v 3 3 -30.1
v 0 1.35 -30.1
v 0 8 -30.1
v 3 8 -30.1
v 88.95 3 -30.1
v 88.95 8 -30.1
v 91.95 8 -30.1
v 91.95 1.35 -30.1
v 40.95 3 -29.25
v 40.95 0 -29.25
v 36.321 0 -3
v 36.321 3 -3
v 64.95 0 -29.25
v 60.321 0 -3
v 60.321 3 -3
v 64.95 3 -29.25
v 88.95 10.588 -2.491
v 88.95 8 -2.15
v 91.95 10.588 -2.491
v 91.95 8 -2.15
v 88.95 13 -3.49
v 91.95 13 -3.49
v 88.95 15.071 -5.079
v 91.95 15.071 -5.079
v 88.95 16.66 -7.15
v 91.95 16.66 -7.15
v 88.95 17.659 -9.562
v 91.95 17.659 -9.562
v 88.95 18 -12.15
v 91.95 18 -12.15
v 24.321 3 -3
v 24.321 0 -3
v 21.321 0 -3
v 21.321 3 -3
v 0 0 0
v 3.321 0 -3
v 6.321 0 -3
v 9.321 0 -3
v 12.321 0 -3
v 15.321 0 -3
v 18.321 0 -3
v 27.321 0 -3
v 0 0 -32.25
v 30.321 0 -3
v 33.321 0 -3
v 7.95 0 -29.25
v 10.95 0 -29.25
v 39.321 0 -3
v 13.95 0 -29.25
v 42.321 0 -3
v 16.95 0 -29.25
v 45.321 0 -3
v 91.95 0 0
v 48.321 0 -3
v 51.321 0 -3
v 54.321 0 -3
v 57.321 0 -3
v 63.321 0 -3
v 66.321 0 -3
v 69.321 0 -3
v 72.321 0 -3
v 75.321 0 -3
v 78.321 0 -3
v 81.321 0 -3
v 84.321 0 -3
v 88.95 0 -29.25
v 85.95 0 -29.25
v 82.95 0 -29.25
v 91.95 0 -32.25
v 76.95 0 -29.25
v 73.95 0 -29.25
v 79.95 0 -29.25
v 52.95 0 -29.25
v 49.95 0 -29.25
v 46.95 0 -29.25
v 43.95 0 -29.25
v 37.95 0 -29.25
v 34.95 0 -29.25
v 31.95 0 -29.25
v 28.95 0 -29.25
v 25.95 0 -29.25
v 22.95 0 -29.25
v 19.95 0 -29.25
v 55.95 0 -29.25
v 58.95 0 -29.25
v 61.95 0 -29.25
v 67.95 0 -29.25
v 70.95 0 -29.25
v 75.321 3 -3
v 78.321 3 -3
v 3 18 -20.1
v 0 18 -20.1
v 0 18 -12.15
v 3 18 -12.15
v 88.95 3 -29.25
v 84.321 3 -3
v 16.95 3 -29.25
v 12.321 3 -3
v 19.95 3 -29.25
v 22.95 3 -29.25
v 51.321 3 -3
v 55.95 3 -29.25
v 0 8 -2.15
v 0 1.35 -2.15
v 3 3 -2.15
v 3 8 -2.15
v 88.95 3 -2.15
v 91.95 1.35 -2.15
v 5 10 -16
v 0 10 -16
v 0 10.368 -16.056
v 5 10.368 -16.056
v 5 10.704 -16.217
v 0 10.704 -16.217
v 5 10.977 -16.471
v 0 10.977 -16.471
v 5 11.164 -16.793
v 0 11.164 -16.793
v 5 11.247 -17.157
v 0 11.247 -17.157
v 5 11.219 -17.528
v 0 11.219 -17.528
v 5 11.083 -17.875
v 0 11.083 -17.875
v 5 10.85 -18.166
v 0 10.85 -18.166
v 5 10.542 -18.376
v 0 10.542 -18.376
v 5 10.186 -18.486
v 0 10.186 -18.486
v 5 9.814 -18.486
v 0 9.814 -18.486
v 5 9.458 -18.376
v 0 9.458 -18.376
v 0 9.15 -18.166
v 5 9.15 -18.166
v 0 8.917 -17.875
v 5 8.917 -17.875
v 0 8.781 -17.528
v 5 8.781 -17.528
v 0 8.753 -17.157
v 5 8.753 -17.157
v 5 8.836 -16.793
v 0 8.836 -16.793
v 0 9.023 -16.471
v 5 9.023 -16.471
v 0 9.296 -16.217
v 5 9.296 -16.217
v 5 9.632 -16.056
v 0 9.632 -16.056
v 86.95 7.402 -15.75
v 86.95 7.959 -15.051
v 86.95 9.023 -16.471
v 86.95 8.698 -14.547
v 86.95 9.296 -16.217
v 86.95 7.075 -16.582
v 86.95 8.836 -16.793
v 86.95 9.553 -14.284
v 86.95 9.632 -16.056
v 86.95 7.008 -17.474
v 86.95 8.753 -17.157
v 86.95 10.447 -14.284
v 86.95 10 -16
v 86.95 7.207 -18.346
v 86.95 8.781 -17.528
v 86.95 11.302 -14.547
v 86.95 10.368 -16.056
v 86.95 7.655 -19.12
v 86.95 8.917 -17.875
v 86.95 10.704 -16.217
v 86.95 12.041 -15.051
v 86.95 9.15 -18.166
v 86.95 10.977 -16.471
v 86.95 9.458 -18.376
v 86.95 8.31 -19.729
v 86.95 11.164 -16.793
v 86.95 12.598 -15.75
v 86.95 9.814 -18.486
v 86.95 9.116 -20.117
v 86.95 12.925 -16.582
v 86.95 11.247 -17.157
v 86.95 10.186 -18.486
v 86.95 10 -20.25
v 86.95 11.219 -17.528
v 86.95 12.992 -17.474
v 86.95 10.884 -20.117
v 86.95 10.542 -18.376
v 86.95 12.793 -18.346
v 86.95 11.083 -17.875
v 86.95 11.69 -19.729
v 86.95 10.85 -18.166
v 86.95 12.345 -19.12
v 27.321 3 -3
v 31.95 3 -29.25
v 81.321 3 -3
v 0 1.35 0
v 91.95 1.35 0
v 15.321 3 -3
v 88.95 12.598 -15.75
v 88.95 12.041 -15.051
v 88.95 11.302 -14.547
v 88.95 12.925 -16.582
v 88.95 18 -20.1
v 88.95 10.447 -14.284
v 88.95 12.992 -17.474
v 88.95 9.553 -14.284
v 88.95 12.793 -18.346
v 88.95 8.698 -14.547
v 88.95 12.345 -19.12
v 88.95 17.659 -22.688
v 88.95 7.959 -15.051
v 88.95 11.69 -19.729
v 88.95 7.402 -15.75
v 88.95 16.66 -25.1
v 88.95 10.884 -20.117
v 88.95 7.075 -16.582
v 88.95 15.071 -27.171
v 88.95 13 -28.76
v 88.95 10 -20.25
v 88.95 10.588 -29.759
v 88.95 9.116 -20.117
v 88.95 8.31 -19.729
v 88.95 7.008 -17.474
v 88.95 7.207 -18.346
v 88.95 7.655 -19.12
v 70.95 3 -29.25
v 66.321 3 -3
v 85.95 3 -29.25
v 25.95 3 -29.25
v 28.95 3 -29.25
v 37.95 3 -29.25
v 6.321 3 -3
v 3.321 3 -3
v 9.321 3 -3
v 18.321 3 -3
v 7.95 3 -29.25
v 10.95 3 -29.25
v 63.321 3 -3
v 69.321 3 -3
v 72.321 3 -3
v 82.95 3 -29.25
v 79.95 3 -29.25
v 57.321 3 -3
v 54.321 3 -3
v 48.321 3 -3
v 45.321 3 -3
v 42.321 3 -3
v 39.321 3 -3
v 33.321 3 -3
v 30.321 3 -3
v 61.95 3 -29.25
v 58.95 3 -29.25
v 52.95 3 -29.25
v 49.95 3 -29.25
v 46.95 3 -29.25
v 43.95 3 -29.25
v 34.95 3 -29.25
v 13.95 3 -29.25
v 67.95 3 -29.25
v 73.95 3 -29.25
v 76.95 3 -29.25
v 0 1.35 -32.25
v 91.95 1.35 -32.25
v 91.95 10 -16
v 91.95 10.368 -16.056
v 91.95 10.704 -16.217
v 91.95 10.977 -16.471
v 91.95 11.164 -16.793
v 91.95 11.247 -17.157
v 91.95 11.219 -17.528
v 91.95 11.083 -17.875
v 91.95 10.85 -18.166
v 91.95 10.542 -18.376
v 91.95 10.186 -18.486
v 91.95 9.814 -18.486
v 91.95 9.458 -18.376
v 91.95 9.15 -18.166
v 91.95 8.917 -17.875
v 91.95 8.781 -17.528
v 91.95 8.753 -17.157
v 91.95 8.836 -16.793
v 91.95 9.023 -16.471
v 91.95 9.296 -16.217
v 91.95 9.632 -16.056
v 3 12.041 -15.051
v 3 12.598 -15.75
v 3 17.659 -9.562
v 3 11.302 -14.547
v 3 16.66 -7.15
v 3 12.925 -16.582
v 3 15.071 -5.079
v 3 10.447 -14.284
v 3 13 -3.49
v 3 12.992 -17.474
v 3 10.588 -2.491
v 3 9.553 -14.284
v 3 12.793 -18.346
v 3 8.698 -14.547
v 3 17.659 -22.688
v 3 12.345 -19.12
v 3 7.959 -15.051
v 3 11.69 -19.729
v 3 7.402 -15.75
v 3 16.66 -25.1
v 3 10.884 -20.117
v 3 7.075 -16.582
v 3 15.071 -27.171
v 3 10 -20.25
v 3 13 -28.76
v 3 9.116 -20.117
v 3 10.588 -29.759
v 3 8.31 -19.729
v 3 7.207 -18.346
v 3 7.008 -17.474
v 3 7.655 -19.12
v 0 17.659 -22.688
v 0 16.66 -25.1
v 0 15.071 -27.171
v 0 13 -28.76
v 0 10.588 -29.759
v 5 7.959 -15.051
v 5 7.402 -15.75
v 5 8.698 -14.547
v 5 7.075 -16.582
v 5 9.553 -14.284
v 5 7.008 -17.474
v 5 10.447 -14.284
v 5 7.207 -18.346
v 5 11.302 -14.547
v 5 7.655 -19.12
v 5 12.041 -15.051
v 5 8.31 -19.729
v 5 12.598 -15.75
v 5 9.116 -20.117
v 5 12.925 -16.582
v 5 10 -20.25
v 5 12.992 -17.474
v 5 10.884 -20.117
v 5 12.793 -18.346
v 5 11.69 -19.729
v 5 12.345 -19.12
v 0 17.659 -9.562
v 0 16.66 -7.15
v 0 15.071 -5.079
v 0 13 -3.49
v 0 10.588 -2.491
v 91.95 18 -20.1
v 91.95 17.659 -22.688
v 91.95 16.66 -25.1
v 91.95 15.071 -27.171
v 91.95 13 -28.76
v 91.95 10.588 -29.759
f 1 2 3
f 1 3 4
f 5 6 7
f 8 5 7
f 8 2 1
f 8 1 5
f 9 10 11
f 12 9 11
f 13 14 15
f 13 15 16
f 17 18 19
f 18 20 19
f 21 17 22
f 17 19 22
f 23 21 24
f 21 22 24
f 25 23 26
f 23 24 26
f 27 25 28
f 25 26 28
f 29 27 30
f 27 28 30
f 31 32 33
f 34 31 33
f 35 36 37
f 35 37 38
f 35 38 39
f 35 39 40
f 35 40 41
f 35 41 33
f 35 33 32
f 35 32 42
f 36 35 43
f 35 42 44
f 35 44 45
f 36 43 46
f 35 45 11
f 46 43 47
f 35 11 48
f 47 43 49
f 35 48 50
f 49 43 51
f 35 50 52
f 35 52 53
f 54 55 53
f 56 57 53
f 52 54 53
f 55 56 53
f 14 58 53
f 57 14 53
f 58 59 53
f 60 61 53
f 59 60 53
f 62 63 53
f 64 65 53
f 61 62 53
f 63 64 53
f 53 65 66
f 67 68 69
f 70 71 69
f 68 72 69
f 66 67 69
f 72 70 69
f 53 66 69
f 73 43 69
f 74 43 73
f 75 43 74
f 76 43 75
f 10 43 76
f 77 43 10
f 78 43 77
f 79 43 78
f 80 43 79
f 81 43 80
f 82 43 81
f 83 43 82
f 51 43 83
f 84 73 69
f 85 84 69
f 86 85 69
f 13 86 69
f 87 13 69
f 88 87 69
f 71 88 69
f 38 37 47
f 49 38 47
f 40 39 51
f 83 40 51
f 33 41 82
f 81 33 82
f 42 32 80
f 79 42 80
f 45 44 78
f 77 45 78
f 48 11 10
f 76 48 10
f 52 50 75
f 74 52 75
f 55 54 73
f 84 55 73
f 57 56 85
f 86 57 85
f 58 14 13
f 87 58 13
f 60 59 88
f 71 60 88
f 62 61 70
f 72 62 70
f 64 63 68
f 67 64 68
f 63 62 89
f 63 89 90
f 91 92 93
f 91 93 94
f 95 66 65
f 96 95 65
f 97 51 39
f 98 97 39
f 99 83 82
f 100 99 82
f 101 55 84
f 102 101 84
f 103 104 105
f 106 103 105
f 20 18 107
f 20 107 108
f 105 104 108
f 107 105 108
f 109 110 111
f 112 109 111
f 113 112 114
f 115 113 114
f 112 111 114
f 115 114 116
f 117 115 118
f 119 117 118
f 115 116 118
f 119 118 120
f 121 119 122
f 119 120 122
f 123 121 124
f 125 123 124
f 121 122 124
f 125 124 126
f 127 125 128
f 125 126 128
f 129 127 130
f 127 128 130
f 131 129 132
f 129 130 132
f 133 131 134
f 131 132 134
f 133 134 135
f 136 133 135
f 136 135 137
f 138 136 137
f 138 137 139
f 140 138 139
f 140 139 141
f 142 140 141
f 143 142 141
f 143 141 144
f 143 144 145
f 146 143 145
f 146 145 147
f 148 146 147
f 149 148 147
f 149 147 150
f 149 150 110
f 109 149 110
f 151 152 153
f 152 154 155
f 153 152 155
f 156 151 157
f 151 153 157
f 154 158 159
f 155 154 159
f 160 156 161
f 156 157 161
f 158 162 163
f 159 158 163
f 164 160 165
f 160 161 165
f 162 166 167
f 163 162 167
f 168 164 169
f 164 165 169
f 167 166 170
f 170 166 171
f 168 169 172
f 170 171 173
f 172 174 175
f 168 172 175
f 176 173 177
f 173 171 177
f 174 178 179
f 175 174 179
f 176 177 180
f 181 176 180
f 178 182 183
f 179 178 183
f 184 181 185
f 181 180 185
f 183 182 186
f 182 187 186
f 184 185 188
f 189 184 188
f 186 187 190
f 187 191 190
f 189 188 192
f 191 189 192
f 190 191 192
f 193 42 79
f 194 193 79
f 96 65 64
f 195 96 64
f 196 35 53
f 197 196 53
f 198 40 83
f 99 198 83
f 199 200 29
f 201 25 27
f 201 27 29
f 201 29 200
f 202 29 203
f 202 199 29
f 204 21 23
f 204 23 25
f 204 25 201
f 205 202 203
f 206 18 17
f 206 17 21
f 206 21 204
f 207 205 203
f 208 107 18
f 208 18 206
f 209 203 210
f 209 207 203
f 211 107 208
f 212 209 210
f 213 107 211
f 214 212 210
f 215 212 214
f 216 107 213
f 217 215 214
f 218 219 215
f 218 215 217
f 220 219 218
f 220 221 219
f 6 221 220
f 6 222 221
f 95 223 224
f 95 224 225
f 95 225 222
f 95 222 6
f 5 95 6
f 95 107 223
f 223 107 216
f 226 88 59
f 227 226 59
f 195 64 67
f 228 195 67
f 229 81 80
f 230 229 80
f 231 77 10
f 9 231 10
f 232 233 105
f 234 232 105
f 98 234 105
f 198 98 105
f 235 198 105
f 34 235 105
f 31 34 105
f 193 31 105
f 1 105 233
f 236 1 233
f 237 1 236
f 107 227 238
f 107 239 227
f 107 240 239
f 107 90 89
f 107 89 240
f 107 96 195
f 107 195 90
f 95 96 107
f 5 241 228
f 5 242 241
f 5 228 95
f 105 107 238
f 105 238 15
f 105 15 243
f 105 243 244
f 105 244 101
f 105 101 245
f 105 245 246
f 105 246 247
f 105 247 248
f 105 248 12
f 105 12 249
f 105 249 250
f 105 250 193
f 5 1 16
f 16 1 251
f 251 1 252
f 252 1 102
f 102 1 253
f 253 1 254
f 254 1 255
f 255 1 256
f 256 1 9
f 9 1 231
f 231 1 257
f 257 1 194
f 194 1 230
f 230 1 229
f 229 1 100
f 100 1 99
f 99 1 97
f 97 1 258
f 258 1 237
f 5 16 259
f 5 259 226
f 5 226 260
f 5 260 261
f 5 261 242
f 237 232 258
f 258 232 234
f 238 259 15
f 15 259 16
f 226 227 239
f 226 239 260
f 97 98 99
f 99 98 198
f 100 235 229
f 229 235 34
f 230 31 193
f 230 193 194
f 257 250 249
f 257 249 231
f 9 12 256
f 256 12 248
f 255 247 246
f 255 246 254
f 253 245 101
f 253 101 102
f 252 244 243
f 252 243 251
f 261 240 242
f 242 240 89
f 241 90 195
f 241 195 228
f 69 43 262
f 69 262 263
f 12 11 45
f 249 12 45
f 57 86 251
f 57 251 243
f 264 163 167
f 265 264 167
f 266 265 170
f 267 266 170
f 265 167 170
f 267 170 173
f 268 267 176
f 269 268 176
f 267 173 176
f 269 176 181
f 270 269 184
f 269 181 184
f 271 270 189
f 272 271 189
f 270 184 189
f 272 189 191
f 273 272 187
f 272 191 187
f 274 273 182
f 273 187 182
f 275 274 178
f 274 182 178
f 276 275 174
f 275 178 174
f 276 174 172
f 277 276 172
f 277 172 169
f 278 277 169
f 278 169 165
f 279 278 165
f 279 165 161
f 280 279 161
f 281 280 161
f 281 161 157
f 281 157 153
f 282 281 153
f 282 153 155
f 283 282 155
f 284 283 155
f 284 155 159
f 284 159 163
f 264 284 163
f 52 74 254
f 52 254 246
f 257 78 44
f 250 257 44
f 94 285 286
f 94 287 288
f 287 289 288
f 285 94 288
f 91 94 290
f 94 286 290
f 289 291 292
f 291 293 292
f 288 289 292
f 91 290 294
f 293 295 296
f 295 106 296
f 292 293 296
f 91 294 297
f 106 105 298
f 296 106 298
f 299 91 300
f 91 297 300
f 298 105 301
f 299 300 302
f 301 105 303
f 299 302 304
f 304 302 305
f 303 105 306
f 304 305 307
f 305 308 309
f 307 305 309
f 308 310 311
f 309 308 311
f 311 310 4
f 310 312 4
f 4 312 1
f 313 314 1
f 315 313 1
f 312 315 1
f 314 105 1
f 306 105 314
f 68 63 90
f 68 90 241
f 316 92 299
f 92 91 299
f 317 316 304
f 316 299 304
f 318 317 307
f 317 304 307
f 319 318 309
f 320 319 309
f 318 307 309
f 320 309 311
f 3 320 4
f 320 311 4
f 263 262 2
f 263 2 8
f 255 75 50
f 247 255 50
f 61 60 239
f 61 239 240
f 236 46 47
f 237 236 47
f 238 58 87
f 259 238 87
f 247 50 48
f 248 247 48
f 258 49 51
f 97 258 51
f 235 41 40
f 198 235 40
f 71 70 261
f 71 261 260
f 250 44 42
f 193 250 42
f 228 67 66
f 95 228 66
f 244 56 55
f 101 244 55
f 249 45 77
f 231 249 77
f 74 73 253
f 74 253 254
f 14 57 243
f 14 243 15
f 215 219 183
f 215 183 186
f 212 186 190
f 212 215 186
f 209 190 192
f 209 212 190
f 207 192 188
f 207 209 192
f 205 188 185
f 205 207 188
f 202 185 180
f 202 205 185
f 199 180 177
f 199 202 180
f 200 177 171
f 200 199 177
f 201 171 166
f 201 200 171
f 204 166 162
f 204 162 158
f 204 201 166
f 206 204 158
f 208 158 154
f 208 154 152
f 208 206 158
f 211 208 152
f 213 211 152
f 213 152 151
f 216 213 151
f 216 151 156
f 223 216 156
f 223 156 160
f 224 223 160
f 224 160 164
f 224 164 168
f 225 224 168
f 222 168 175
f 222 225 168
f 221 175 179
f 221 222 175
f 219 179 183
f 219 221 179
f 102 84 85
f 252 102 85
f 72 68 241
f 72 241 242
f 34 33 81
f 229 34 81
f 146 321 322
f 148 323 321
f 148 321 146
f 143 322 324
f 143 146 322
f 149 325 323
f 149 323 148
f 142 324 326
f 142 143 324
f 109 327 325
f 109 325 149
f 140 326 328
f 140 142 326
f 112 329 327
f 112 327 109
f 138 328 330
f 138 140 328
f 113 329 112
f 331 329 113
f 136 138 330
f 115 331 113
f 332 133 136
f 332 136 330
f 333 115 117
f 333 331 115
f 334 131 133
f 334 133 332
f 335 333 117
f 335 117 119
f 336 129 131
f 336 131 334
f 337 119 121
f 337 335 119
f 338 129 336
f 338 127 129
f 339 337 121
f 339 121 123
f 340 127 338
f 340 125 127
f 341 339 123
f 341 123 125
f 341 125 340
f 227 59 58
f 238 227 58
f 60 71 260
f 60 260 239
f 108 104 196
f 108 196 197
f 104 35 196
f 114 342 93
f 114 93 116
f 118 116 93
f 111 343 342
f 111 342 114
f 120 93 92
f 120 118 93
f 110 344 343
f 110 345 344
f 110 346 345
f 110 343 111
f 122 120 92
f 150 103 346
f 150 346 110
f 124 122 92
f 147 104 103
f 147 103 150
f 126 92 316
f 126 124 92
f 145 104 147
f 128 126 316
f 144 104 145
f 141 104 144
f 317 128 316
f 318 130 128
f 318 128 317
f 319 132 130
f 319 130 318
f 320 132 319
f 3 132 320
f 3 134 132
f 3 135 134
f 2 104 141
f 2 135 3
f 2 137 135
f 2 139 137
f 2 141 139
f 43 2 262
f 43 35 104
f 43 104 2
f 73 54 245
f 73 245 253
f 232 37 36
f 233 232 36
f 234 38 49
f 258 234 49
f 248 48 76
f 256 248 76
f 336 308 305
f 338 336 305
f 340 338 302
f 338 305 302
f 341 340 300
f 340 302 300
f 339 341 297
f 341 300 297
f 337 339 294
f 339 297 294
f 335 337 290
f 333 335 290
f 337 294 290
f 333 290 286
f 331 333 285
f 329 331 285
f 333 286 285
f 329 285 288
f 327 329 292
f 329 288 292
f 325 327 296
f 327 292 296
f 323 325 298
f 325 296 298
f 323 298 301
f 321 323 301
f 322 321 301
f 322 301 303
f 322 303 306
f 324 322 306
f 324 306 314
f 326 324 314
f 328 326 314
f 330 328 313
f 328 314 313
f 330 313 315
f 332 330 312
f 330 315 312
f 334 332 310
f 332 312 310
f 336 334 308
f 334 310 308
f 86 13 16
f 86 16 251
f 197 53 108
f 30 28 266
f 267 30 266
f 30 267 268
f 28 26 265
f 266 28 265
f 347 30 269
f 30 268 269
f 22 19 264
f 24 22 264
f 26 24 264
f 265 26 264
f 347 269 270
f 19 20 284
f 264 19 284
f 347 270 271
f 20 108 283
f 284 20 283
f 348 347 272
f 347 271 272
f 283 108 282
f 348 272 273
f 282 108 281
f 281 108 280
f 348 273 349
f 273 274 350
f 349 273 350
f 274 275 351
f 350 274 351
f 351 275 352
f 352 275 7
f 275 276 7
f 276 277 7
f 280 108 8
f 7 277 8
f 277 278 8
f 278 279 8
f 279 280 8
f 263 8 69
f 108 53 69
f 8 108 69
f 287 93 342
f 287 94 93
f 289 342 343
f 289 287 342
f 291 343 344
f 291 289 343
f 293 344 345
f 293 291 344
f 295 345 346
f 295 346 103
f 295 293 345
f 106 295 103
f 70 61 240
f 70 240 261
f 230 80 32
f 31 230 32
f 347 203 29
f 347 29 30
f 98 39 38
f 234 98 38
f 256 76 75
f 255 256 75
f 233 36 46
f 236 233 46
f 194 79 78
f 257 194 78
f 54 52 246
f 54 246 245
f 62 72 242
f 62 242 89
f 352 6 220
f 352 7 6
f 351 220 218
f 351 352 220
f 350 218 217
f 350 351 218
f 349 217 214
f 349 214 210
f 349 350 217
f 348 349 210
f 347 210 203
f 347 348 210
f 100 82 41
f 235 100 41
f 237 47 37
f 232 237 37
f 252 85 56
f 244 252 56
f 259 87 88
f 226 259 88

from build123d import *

# Parameters (mm, degrees)
SKETCH1_W               = 91.95
SKETCH1_H               = 32.25
BOSS_EXTRUDE1_DEPTH     = 3
SKETCH2_W               = 91.95
SKETCH2_H               = 2.15
CUT_EXTRUDE1_DEPTH      = 1.65
SKETCH4_W               = 3
SKETCH4_H               = 27.95
BOSS_EXTRUDE2_DEPTH     = 15
SKETCH5_R               = 1.25
CUT_EXTRUDE2_DEPTH      = 1
CUT_EXTRUDE2_DEPTH_BACK = 92.95
FILLET2_R               = 10
CUT_EXTRUDE5_REACH      = 20
SKETCH8_R               = 3
BOSS_EXTRUDE3_DEPTH     = 2
SKETCH9_R               = 1.25
CUT_EXTRUDE6_DEPTH      = 1
CUT_EXTRUDE6_DEPTH_BACK = 92.95


with BuildPart() as part:
    # Sketch1 → Boss-Extrude1 (new body)
    with BuildSketch(Plane(origin=(0, 0, 0), x_dir=(1, 0, 0), z_dir=(0, 1, 0))):
        with Locations((45.975, 16.125)):
            Rectangle(SKETCH1_W, SKETCH1_H)
    extrude(amount=BOSS_EXTRUDE1_DEPTH)

    # Sketch2 → Cut-Extrude1 (cut)
    with BuildSketch(Plane(origin=(0, 3, 0), x_dir=(1, 0, 0), z_dir=(0, 1, 0))):
        with Locations((45.975, 31.175)):
            Rectangle(SKETCH2_W, SKETCH2_H)
        with Locations((45.975, 1.075)):
            Rectangle(SKETCH2_W, SKETCH2_H)
    extrude(amount=-CUT_EXTRUDE1_DEPTH, mode=Mode.SUBTRACT)

    # Sketch4 → Boss-Extrude2 (add)
    with BuildSketch(Plane(origin=(0, 3, 0), x_dir=(1, 0, 0), z_dir=(0, 1, 0))):
        with Locations((1.5, 16.125)):
            Rectangle(SKETCH4_W, SKETCH4_H)
        with Locations((90.45, 16.125)):
            Rectangle(SKETCH4_W, SKETCH4_H)
    extrude(amount=BOSS_EXTRUDE2_DEPTH)

    # Sketch5 → Cut-Extrude2 (cut, two sides)
    with BuildSketch(Plane.ZY) as cut_extrude2_sk:
        with Locations((-17.25, 10)):
            Circle(SKETCH5_R)
    extrude(amount=CUT_EXTRUDE2_DEPTH, mode=Mode.SUBTRACT)
    extrude(cut_extrude2_sk.sketch, amount=-CUT_EXTRUDE2_DEPTH_BACK, mode=Mode.SUBTRACT)

    # Fillet2
    fillet2_edges = [part.edges().sort_by_distance(p)[0] for p in [
        (1.5, 18, -2.15),
        (1.5, 18, -30.1),
        (90.45, 18, -30.1),
        (90.45, 18, -2.15),
    ]]
    fillet(fillet2_edges, radius=FILLET2_R)

    # Sketch7 → Cut-Extrude5 (cut, up to next)
    with BuildSketch(Plane.XZ, mode=Mode.PRIVATE) as cut_extrude5_sk1:
        Polygon((7.95, -29.25), (10.95, -29.25), (6.321416756, -3), (3.321416756, -3), align=None)
    cut_extrude5_tool1 = extrude(cut_extrude5_sk1.sketch, amount=-CUT_EXTRUDE5_REACH, mode=Mode.PRIVATE) & part.part
    add(cut_extrude5_tool1.solids().sort_by_distance((7.135708, 0, -16.125))[0], mode=Mode.SUBTRACT)
    # Sketch7 → Cut-Extrude5 (cut, up to next)
    with BuildSketch(Plane.XZ, mode=Mode.PRIVATE) as cut_extrude5_sk2:
        Polygon((19.95, -29.25), (22.95, -29.25), (18.321416756, -3), (15.321416756, -3), align=None)
    cut_extrude5_tool2 = extrude(cut_extrude5_sk2.sketch, amount=-CUT_EXTRUDE5_REACH, mode=Mode.PRIVATE) & part.part
    add(cut_extrude5_tool2.solids().sort_by_distance((19.135708, 0, -16.125))[0], mode=Mode.SUBTRACT)
    # Sketch7 → Cut-Extrude5 (cut, up to next)
    with BuildSketch(Plane.XZ, mode=Mode.PRIVATE) as cut_extrude5_sk3:
        Polygon((25.95, -29.25), (28.95, -29.25), (24.321416756, -3), (21.321416756, -3), align=None)
    cut_extrude5_tool3 = extrude(cut_extrude5_sk3.sketch, amount=-CUT_EXTRUDE5_REACH, mode=Mode.PRIVATE) & part.part
    add(cut_extrude5_tool3.solids().sort_by_distance((25.135708, 0, -16.125))[0], mode=Mode.SUBTRACT)
    # Sketch7 → Cut-Extrude5 (cut, up to next)
    with BuildSketch(Plane.XZ, mode=Mode.PRIVATE) as cut_extrude5_sk4:
        Polygon((31.95, -29.25), (34.95, -29.25), (30.321416756, -3), (27.321416756, -3), align=None)
    cut_extrude5_tool4 = extrude(cut_extrude5_sk4.sketch, amount=-CUT_EXTRUDE5_REACH, mode=Mode.PRIVATE) & part.part
    add(cut_extrude5_tool4.solids().sort_by_distance((31.135708, 0, -16.125))[0], mode=Mode.SUBTRACT)
    # Sketch7 → Cut-Extrude5 (cut, up to next)
    with BuildSketch(Plane.XZ, mode=Mode.PRIVATE) as cut_extrude5_sk5:
        Polygon((37.95, -29.25), (40.95, -29.25), (36.321416756, -3), (33.321416756, -3), align=None)
    cut_extrude5_tool5 = extrude(cut_extrude5_sk5.sketch, amount=-CUT_EXTRUDE5_REACH, mode=Mode.PRIVATE) & part.part
    add(cut_extrude5_tool5.solids().sort_by_distance((37.135708, 0, -16.125))[0], mode=Mode.SUBTRACT)
    # Sketch7 → Cut-Extrude5 (cut, up to next)
    with BuildSketch(Plane.XZ, mode=Mode.PRIVATE) as cut_extrude5_sk6:
        Polygon((43.95, -29.25), (46.95, -29.25), (42.321416756, -3), (39.321416756, -3), align=None)
    cut_extrude5_tool6 = extrude(cut_extrude5_sk6.sketch, amount=-CUT_EXTRUDE5_REACH, mode=Mode.PRIVATE) & part.part
    add(cut_extrude5_tool6.solids().sort_by_distance((43.135708, 0, -16.125))[0], mode=Mode.SUBTRACT)
    # Sketch7 → Cut-Extrude5 (cut, up to next)
    with BuildSketch(Plane.XZ, mode=Mode.PRIVATE) as cut_extrude5_sk7:
        Polygon((55.95, -29.25), (58.95, -29.25), (54.321416756, -3), (51.321416756, -3), align=None)
    cut_extrude5_tool7 = extrude(cut_extrude5_sk7.sketch, amount=-CUT_EXTRUDE5_REACH, mode=Mode.PRIVATE) & part.part
    add(cut_extrude5_tool7.solids().sort_by_distance((55.135708, 0, -16.125))[0], mode=Mode.SUBTRACT)
    # Sketch7 → Cut-Extrude5 (cut, up to next)
    with BuildSketch(Plane.XZ, mode=Mode.PRIVATE) as cut_extrude5_sk8:
        Polygon((67.95, -29.25), (70.95, -29.25), (66.321416756, -3), (63.321416756, -3), align=None)
    cut_extrude5_tool8 = extrude(cut_extrude5_sk8.sketch, amount=-CUT_EXTRUDE5_REACH, mode=Mode.PRIVATE) & part.part
    add(cut_extrude5_tool8.solids().sort_by_distance((67.135708, 0, -16.125))[0], mode=Mode.SUBTRACT)
    # Sketch7 → Cut-Extrude5 (cut, up to next)
    with BuildSketch(Plane.XZ, mode=Mode.PRIVATE) as cut_extrude5_sk9:
        Polygon((79.95, -29.25), (75.321416756, -3), (78.321416756, -3), (82.95, -29.25), align=None)
    cut_extrude5_tool9 = extrude(cut_extrude5_sk9.sketch, amount=-CUT_EXTRUDE5_REACH, mode=Mode.PRIVATE) & part.part
    add(cut_extrude5_tool9.solids().sort_by_distance((79.135708, 0, -16.125))[0], mode=Mode.SUBTRACT)
    # Sketch7 → Cut-Extrude5 (cut, up to next)
    with BuildSketch(Plane.XZ, mode=Mode.PRIVATE) as cut_extrude5_sk10:
        Polygon((88.95, -29.25), (84.321416756, -3), (81.321416756, -3), (85.95, -29.25), align=None)
    cut_extrude5_tool10 = extrude(cut_extrude5_sk10.sketch, amount=-CUT_EXTRUDE5_REACH, mode=Mode.PRIVATE) & part.part
    add(cut_extrude5_tool10.solids().sort_by_distance((85.135708, 0, -16.125))[0], mode=Mode.SUBTRACT)
    # Sketch7 → Cut-Extrude5 (cut, up to next)
    with BuildSketch(Plane.XZ, mode=Mode.PRIVATE) as cut_extrude5_sk11:
        Polygon((16.95, -29.25), (12.321416756, -3), (9.321416756, -3), (13.95, -29.25), align=None)
    cut_extrude5_tool11 = extrude(cut_extrude5_sk11.sketch, amount=-CUT_EXTRUDE5_REACH, mode=Mode.PRIVATE) & part.part
    add(cut_extrude5_tool11.solids().sort_by_distance((13.135708, 0, -16.125))[0], mode=Mode.SUBTRACT)
    # Sketch7 → Cut-Extrude5 (cut, up to next)
    with BuildSketch(Plane.XZ, mode=Mode.PRIVATE) as cut_extrude5_sk12:
        Polygon((49.95, -29.25), (45.321416756, -3), (48.321416756, -3), (52.95, -29.25), align=None)
    cut_extrude5_tool12 = extrude(cut_extrude5_sk12.sketch, amount=-CUT_EXTRUDE5_REACH, mode=Mode.PRIVATE) & part.part
    add(cut_extrude5_tool12.solids().sort_by_distance((49.135708, 0, -16.125))[0], mode=Mode.SUBTRACT)
    # Sketch7 → Cut-Extrude5 (cut, up to next)
    with BuildSketch(Plane.XZ, mode=Mode.PRIVATE) as cut_extrude5_sk13:
        Polygon((61.95, -29.25), (57.321416756, -3), (60.321416756, -3), (64.95, -29.25), align=None)
    cut_extrude5_tool13 = extrude(cut_extrude5_sk13.sketch, amount=-CUT_EXTRUDE5_REACH, mode=Mode.PRIVATE) & part.part
    add(cut_extrude5_tool13.solids().sort_by_distance((61.135708, 0, -16.125))[0], mode=Mode.SUBTRACT)
    # Sketch7 → Cut-Extrude5 (cut, up to next)
    with BuildSketch(Plane.XZ, mode=Mode.PRIVATE) as cut_extrude5_sk14:
        Polygon((73.95, -29.25), (69.321416756, -3), (72.321416756, -3), (76.95, -29.25), align=None)
    cut_extrude5_tool14 = extrude(cut_extrude5_sk14.sketch, amount=-CUT_EXTRUDE5_REACH, mode=Mode.PRIVATE) & part.part
    add(cut_extrude5_tool14.solids().sort_by_distance((73.135708, 0, -16.125))[0], mode=Mode.SUBTRACT)

    # Sketch8 → Boss-Extrude3 (add)
    with BuildSketch(Plane(origin=(3, 0, 0), x_dir=(0, 0, -1), z_dir=(1, 0, 0))):
        with Locations((17.25, 10)):
            Circle(SKETCH8_R)
    boss_extrude3 = extrude(amount=BOSS_EXTRUDE3_DEPTH)

    # Mirror1: Boss-Extrude3 across plane
    add(boss_extrude3.mirror(Plane(origin=(45.975, 0, 0), x_dir=(0, 0, 1), z_dir=(1, 0, 0))))

    # Sketch9 → Cut-Extrude6 (cut, two sides)
    with BuildSketch(Plane.ZY) as cut_extrude6_sk:
        with Locations((-17.25, 10)):
            Circle(SKETCH9_R)
    extrude(amount=CUT_EXTRUDE6_DEPTH, mode=Mode.SUBTRACT)
    extrude(cut_extrude6_sk.sketch, amount=-CUT_EXTRUDE6_DEPTH_BACK, mode=Mode.SUBTRACT)


solid = part.part
